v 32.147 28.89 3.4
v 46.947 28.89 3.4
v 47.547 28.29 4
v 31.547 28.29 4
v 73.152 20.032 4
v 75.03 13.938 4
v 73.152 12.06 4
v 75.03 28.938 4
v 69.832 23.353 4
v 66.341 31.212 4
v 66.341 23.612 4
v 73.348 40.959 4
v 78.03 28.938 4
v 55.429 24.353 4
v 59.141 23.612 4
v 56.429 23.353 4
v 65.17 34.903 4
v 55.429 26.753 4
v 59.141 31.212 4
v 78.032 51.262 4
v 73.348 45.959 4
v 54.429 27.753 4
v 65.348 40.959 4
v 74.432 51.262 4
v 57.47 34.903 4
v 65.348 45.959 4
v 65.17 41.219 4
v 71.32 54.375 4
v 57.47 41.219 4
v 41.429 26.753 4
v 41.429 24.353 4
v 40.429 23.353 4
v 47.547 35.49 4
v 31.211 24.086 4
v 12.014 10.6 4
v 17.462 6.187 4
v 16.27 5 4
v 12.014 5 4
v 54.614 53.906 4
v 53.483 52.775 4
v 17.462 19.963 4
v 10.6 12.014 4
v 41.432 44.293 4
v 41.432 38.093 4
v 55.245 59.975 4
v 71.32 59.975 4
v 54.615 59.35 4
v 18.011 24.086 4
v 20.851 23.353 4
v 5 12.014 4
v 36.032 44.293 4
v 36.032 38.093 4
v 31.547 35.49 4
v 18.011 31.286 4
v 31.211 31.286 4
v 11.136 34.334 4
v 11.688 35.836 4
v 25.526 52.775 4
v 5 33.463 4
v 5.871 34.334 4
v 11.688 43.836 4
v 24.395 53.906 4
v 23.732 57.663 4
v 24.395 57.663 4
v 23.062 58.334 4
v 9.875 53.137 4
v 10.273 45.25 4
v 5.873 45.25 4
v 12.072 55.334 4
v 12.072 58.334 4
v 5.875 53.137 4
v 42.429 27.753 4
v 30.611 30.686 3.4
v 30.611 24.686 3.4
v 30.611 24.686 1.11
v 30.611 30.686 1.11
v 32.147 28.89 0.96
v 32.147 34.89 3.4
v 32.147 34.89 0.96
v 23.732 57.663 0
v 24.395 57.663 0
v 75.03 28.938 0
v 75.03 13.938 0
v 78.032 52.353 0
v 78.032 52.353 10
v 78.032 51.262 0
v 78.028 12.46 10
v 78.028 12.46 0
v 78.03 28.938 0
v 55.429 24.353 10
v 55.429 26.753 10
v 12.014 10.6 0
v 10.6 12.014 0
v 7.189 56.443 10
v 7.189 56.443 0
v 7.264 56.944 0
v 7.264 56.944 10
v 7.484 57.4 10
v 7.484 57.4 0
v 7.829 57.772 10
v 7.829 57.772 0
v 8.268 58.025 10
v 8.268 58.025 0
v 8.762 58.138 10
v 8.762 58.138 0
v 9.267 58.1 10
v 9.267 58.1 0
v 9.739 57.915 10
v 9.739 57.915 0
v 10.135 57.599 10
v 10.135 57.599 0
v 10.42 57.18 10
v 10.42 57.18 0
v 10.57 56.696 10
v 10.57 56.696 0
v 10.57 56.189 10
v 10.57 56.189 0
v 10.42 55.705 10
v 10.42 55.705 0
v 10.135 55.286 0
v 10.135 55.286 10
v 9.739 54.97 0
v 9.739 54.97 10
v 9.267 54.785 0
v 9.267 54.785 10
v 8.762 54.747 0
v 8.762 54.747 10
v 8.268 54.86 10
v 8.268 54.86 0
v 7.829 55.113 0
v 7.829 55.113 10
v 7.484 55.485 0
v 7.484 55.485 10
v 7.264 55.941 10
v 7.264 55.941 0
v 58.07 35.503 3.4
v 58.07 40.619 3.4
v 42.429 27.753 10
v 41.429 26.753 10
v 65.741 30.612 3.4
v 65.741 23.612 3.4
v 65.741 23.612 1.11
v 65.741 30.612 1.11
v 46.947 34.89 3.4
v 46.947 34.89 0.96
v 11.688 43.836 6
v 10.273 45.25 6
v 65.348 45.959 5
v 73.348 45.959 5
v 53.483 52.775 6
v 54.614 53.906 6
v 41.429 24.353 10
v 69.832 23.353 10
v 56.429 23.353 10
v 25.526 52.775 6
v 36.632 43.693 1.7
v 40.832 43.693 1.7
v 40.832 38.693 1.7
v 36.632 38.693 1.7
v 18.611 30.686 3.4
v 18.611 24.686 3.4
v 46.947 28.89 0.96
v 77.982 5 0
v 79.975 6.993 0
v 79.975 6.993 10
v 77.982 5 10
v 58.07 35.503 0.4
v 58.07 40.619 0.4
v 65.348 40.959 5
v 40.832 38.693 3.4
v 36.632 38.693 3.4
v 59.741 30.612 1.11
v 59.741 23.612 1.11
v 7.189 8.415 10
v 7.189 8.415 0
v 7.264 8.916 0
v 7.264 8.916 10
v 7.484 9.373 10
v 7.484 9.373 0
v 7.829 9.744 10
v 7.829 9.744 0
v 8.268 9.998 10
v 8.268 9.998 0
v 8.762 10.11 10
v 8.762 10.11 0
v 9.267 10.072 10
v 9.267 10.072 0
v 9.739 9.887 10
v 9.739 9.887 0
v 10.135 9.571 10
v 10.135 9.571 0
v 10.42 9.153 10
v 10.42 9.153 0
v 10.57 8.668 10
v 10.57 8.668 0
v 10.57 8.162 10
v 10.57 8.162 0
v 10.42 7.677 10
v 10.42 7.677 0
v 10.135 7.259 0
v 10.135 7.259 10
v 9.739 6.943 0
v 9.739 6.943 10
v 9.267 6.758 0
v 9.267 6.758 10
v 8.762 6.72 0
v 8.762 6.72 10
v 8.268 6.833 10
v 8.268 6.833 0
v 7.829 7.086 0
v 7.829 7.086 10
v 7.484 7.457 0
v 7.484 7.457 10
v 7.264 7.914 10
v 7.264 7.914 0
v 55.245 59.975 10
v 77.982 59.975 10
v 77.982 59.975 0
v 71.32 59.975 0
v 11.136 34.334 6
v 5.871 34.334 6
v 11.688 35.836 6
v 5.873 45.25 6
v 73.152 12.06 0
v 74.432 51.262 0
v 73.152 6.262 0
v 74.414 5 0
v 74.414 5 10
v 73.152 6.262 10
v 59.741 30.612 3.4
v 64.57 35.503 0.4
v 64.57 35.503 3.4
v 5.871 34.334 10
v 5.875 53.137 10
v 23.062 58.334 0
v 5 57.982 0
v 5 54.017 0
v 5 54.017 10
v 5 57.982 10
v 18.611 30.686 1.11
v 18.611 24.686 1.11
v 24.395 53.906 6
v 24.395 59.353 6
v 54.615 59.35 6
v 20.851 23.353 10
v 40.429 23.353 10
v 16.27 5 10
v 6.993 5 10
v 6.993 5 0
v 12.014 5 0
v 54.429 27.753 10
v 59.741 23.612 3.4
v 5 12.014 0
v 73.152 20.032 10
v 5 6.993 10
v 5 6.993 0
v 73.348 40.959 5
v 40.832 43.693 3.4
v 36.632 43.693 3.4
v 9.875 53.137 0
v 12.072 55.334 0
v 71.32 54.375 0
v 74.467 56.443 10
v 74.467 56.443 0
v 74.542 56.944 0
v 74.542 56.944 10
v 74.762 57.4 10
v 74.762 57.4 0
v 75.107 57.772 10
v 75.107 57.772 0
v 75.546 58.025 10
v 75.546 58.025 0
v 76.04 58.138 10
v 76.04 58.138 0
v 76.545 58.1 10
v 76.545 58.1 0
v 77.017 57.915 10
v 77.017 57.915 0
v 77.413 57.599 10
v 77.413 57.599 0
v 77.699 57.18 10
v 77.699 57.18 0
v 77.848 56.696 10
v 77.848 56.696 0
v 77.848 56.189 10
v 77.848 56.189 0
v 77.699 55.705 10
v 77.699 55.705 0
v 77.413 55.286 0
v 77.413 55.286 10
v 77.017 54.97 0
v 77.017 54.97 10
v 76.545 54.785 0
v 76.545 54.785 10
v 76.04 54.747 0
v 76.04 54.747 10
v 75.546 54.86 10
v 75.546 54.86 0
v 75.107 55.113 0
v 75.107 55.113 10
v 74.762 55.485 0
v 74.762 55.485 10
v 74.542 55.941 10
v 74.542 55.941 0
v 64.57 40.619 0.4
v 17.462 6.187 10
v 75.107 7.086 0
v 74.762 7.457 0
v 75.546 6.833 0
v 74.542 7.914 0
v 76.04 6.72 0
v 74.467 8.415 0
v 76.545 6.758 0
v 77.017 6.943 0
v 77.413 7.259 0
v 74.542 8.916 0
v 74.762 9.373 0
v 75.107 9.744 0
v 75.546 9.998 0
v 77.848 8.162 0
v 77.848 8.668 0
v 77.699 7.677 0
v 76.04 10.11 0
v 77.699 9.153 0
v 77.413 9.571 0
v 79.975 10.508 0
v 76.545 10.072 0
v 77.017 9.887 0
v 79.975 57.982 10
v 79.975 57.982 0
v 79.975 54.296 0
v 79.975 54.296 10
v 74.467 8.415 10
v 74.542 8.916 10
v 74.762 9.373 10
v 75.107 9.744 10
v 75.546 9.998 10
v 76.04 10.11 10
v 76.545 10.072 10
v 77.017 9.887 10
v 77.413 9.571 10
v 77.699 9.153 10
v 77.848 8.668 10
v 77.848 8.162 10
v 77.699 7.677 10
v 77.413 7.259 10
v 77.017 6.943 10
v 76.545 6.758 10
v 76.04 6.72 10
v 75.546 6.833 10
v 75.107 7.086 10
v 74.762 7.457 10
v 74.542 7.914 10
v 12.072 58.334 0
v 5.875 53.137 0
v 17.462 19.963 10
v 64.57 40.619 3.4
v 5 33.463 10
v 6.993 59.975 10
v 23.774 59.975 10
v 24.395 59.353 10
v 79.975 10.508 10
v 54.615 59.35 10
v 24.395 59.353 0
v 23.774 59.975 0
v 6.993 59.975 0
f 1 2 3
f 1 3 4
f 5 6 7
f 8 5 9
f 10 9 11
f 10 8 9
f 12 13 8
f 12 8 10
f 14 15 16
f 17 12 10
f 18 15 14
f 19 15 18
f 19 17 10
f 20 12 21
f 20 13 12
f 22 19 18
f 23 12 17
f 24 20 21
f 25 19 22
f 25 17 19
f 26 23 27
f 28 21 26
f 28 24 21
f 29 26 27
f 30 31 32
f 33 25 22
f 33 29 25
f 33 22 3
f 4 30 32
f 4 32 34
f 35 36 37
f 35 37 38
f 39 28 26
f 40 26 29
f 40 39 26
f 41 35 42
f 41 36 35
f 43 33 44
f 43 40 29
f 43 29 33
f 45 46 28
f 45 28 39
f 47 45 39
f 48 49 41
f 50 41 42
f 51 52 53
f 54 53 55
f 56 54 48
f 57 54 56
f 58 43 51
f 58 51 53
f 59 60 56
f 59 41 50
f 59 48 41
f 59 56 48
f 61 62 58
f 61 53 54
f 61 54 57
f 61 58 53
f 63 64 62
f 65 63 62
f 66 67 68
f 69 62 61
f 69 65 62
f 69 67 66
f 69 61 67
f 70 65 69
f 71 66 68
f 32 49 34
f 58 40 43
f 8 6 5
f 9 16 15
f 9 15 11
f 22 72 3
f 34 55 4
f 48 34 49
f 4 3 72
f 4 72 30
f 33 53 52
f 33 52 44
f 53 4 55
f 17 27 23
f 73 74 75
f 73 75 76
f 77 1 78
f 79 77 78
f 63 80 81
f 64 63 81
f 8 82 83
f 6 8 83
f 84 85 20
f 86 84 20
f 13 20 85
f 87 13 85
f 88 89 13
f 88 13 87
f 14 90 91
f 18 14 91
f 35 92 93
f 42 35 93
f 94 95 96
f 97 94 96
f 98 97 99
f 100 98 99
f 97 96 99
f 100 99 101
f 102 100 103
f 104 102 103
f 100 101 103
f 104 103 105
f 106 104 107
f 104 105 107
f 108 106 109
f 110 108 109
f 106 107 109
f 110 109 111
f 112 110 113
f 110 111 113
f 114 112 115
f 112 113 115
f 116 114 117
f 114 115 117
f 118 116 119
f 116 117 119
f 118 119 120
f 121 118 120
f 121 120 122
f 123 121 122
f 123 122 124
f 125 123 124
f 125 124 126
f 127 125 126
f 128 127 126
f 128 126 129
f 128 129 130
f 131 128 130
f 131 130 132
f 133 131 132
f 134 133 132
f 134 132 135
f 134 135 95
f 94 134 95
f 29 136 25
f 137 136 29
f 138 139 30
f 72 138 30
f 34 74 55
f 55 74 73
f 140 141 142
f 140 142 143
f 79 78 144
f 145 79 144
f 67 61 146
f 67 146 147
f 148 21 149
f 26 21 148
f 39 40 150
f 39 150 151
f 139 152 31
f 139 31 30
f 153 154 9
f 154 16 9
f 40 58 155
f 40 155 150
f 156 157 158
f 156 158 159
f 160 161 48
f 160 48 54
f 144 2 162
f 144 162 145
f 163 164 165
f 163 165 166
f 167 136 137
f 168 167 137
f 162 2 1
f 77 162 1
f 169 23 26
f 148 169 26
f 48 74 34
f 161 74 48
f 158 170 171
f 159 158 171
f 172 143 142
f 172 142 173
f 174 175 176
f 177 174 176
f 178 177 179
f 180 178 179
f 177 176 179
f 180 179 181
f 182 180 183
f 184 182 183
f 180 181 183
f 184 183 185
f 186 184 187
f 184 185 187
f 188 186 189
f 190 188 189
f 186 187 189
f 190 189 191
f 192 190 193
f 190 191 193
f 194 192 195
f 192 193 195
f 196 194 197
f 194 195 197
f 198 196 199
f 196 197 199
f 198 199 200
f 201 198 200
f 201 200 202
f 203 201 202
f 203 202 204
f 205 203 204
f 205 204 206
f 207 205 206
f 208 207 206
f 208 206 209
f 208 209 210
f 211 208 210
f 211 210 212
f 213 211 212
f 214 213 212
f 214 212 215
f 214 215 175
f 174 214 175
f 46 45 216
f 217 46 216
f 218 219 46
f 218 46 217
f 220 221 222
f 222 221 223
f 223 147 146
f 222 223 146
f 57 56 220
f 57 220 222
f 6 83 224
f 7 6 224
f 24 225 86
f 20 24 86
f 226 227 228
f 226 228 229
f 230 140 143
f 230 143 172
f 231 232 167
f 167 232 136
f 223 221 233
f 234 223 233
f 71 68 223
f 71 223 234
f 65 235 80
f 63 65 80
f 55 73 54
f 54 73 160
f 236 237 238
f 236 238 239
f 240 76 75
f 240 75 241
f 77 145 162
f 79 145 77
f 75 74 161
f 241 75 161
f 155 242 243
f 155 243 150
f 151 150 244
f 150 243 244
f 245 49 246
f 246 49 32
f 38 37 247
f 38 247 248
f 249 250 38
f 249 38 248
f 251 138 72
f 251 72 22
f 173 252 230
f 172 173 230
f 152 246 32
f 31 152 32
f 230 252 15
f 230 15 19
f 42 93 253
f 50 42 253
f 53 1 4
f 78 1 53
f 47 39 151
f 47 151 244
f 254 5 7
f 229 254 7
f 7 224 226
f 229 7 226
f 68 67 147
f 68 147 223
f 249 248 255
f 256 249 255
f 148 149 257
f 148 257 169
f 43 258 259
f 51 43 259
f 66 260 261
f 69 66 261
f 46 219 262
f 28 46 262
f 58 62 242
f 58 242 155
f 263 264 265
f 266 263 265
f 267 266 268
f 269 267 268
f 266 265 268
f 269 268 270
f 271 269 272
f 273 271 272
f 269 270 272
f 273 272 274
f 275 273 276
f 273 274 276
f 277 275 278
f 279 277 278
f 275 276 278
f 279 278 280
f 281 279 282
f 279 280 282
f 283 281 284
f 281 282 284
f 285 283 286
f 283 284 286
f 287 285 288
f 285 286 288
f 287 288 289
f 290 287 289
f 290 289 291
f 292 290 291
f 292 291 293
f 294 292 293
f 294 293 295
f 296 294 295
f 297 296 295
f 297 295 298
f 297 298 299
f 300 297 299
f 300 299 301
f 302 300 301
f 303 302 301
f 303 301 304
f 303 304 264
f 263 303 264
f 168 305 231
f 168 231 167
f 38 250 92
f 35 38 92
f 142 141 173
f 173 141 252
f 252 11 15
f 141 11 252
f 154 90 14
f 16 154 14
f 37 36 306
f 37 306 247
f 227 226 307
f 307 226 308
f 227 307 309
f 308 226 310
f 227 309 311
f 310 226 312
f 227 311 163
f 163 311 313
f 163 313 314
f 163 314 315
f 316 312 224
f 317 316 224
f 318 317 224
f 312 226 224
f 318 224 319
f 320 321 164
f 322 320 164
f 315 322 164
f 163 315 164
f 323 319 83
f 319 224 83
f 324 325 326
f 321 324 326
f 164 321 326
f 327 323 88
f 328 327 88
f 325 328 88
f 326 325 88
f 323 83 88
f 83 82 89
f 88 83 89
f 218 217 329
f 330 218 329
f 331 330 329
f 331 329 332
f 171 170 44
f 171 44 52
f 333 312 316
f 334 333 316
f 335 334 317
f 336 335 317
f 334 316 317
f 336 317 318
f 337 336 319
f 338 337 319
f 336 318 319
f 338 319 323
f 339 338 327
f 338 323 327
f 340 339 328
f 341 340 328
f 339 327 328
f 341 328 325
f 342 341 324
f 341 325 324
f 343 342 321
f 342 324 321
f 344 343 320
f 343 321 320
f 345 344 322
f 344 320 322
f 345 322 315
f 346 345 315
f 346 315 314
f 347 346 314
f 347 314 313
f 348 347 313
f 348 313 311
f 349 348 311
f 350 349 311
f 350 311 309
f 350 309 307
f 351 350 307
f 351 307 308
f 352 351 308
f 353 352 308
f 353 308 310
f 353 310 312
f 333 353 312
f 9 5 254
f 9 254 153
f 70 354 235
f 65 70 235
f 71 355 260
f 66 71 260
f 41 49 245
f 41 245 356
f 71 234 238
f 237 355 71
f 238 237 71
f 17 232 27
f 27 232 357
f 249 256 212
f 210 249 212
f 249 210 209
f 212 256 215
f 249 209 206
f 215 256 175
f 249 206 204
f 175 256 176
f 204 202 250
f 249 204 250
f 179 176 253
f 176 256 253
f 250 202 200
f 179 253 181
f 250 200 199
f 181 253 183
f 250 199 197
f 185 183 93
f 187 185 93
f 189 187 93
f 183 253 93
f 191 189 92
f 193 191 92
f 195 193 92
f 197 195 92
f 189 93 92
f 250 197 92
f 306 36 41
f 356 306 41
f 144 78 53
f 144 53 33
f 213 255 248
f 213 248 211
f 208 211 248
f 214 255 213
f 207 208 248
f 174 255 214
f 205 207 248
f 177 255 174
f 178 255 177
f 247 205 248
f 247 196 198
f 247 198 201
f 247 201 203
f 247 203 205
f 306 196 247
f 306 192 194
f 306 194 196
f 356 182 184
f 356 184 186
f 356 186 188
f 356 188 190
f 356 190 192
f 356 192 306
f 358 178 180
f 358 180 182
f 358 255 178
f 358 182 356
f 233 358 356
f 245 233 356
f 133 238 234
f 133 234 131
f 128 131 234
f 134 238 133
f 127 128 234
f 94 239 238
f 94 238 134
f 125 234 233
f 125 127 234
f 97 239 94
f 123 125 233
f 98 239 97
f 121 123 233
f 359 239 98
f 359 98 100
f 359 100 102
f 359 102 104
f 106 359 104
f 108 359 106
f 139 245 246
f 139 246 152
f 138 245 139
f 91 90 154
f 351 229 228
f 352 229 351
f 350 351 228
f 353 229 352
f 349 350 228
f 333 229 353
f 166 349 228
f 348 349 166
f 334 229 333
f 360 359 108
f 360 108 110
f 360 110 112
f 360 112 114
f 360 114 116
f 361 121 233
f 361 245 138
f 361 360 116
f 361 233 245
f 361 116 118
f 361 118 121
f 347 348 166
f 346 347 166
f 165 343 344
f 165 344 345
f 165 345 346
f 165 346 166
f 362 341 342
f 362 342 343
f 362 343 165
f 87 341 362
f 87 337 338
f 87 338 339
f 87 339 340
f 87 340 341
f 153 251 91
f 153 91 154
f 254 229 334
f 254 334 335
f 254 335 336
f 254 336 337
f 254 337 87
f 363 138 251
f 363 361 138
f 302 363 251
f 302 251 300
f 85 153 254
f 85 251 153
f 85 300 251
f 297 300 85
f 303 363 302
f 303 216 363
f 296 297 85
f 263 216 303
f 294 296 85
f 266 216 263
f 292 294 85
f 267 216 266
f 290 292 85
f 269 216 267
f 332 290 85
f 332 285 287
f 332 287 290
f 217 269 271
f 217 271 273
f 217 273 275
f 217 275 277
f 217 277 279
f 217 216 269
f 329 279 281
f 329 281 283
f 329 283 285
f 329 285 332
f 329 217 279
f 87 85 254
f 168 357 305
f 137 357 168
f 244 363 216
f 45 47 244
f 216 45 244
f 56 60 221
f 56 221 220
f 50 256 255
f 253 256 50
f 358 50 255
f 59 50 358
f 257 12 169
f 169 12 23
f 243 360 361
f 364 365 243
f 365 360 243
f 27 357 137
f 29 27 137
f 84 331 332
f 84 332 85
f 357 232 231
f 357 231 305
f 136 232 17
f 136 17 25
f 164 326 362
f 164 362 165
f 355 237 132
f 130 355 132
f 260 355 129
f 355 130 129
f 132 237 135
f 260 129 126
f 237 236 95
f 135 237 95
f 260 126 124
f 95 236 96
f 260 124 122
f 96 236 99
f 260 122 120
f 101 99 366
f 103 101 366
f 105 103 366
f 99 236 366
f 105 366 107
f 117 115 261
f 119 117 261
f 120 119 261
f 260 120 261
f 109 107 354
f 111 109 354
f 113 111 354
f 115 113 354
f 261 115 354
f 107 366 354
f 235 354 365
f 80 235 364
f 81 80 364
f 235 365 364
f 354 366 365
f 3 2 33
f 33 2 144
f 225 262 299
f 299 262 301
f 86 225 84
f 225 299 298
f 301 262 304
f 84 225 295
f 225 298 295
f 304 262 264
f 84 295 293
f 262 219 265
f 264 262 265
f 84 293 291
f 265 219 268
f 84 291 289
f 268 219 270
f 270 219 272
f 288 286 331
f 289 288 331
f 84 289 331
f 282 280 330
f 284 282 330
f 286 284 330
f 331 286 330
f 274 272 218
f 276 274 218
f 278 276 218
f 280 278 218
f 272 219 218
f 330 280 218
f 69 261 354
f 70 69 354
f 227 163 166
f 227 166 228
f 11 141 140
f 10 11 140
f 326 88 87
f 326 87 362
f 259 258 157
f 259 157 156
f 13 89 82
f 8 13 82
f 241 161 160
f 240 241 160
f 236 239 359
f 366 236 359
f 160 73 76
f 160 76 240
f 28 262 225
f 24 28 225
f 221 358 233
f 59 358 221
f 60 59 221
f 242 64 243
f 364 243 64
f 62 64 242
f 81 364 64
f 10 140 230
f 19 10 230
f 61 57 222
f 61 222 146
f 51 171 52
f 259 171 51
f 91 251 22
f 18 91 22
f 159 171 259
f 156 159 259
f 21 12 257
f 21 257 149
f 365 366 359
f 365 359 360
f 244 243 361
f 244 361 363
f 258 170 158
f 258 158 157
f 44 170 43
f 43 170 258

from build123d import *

# Parameters (mm, degrees)
SKETCH_1_W           = 85
SKETCH_1_H           = 65
EXTRUDE_1_DEPTH      = 10
CUT_EXTRUDE_1_REACH  = 109.471
SKETCH_2_R           = 1.7
CUT_EXTRUDE_2_REACH  = 109.471
SKETCH_3_W           = 85
SKETCH_3_H           = 65
CUT_EXTRUDE_4_REACH  = 102.464
CUT_EXTRUDE_7_DEPTH  = 6
CUT_EXTRUDE_8_DEPTH  = 6
CUT_EXTRUDE_11_DEPTH = 4
SKETCH_8_W           = 8
SKETCH_8_H           = 5
CUT_EXTRUDE_12_DEPTH = 1
SKETCH_10_W          = 5.4
SKETCH_10_H          = 6
SKETCH_10_W_2        = 4
EXTRUDE_2_DEPTH      = 3.04
SKETCH_11_W          = 4.2
SKETCH_11_H          = 5
EXTRUDE_3_DEPTH      = 2.300115
SKETCH_12_W          = 12
SKETCH_12_H          = 6
EXTRUDE_4_DEPTH      = 2.89
SKETCH_13_W          = 6.499986347
SKETCH_13_H          = 5.115524378
EXTRUDE_5_DEPTH      = 3.6
SKETCH_14_W          = 6
SKETCH_14_H          = 7
EXTRUDE_6_DEPTH      = 2.890002
SKETCH_15_W          = 14
SKETCH_15_H          = 4.4
CUT_EXTRUDE_13_DEPTH = 6
CHAMFER_1_SIZE       = 1
CHAMFER_2_SIZE       = 0.6
CHAMFER_3_SIZE       = 0.6
CHAMFER_4_SIZE       = 0.6
CHAMFER_5_SIZE       = 0.6
CHAMFER_6_SIZE       = 0.6


with BuildPart() as part:
    # 草图1 → 凸台-拉伸1 (new body)
    with BuildSketch(Plane.XY):
        with Locations((42.5, 32.5)):
            Rectangle(SKETCH_1_W, SKETCH_1_H)
    extrude(amount=EXTRUDE_1_DEPTH)

    # 草图2 → 切除-拉伸1 (cut, up to next)
    with BuildSketch(Plane(origin=(0, 0, 0), x_dir=(-1, 0, 0), z_dir=(0, 0, -1)), mode=Mode.PRIVATE) as cut_extrude_1_sk1:
        with Locations((-76.166921514, 56.442524765)):
            Circle(SKETCH_2_R)
    cut_extrude_1_tool1 = extrude(cut_extrude_1_sk1.sketch, amount=-CUT_EXTRUDE_1_REACH, mode=Mode.PRIVATE) & part.part
    # 草图2 → 切除-拉伸1 (cut, up to next)
    with BuildSketch(Plane(origin=(0, 0, 0), x_dir=(-1, 0, 0), z_dir=(0, 0, -1)), mode=Mode.PRIVATE) as cut_extrude_1_sk2:
        with Locations((-8.888803658, 56.442524765)):
            Circle(SKETCH_2_R)
    cut_extrude_1_tool2 = extrude(cut_extrude_1_sk2.sketch, amount=-CUT_EXTRUDE_1_REACH, mode=Mode.PRIVATE) & part.part
    # 草图2 → 切除-拉伸1 (cut, up to next)
    with BuildSketch(Plane(origin=(0, 0, 0), x_dir=(-1, 0, 0), z_dir=(0, 0, -1)), mode=Mode.PRIVATE) as cut_extrude_1_sk3:
        with Locations((-76.166921514, 8.41508509)):
            Circle(SKETCH_2_R)
    cut_extrude_1_tool3 = extrude(cut_extrude_1_sk3.sketch, amount=-CUT_EXTRUDE_1_REACH, mode=Mode.PRIVATE) & part.part
    # 草图2 → 切除-拉伸1 (cut, up to next)
    with BuildSketch(Plane(origin=(0, 0, 0), x_dir=(-1, 0, 0), z_dir=(0, 0, -1)), mode=Mode.PRIVATE) as cut_extrude_1_sk4:
        with Locations((-8.888803658, 8.41508509)):
            Circle(SKETCH_2_R)
    cut_extrude_1_tool4 = extrude(cut_extrude_1_sk4.sketch, amount=-CUT_EXTRUDE_1_REACH, mode=Mode.PRIVATE) & part.part
    add(cut_extrude_1_tool1.solids().sort_by_distance((76.166922, 56.442525, 0))[0], mode=Mode.SUBTRACT)
    add(cut_extrude_1_tool2.solids().sort_by_distance((8.888804, 56.442525, 0))[0], mode=Mode.SUBTRACT)
    add(cut_extrude_1_tool3.solids().sort_by_distance((76.166922, 8.415085, 0))[0], mode=Mode.SUBTRACT)
    add(cut_extrude_1_tool4.solids().sort_by_distance((8.888804, 8.415085, 0))[0], mode=Mode.SUBTRACT)

    # 草图3 → 切除-拉伸2 (cut, up to next)
    with BuildSketch(Plane(origin=(0, 0, 0), x_dir=(-1, 0, 0), z_dir=(0, 0, -1)), mode=Mode.PRIVATE) as cut_extrude_2_sk1:
        with Locations((-42.5, 32.5)):
            Rectangle(SKETCH_3_W, SKETCH_3_H)
        Polygon((-5, 33.462892894), (-5.871324699, 34.334217592), (-5.87504445, 53.137061214), (-5, 54.017366187), (-5, 57.982143592), (-6.992565577, 59.974709169), (-23.773560915, 59.974709169), (-24.394872914, 59.353397171), (-54.61482093, 59.349677419), (-55.245113202, 59.974709169), (-77.982184232, 59.974709169), (-79.974749809, 57.982143592), (-79.97474981, 54.295829484), (-78.032030648, 52.353110322), (-78.028310897, 12.45999492), (-79.97474981, 10.508295484), (-79.97474981, 6.992565577), (-77.982184232, 5), (-74.414239441, 5), (-73.152434681, 6.26180476), (-60.043505207, 6.265524511), (-58.772720173, 5), (-32.926479725, 5), (-31.743585303, 6.182894422), (-17.461559563, 6.186614173), (-16.269684867, 5), (-6.992565577, 5), (-5, 6.992565577), align=None, mode=Mode.SUBTRACT)
    cut_extrude_2_tool1 = extrude(cut_extrude_2_sk1.sketch, amount=-CUT_EXTRUDE_2_REACH, mode=Mode.PRIVATE) & part.part
    add(cut_extrude_2_tool1.solids().sort_by_distance((42.5, 63.929953, 0))[0], mode=Mode.SUBTRACT)

    # 草图4 → 切除-拉伸4 (cut, up to next)
    with BuildSketch(Plane(origin=(0, 0, 0), x_dir=(-1, 0, 0), z_dir=(0, 0, -1)), mode=Mode.PRIVATE) as cut_extrude_4_sk1:
        Polygon((-73.152434681, 6.26180476), (-73.152434681, 20.032317315), (-69.831576581, 23.353175415), (-46.787984184, 23.353175415), (-20.851296271, 23.353175415), (-17.461559563, 19.963438707), (-17.461559563, 6.186614173), (-17.461559563, 0.193960815), (-73.152434681, 0.193960815), align=None)
    cut_extrude_4_tool1 = extrude(cut_extrude_4_sk1.sketch, amount=-CUT_EXTRUDE_4_REACH, mode=Mode.PRIVATE) & part.part
    add(cut_extrude_4_tool1.solids().sort_by_distance((45.311727, 11.681443, 0))[0], mode=Mode.SUBTRACT)

    # 草图5 → 切除-拉伸7 (cut)
    with BuildSketch(Plane(origin=(0, 0, 0), x_dir=(-1, 0, 0), z_dir=(0, 0, -1))):
        Polygon((-24.394872914, 59.353397171), (-24.394872914, 53.906418167), (-25.526104495, 52.774908066), (-53.482640788, 52.774908066), (-54.614150889, 53.906139647), (-54.61482093, 59.349677419), align=None)
    extrude(amount=-CUT_EXTRUDE_7_DEPTH, mode=Mode.SUBTRACT)

    # 草图6 → 切除-拉伸8 (cut)
    with BuildSketch(Plane(origin=(0, 0, 0), x_dir=(-1, 0, 0), z_dir=(0, 0, -1))):
        Polygon((-5.871324699, 34.334217592), (-11.136213102, 34.334217592), (-11.687697798, 35.836171197), (-11.687697798, 43.836171197), (-10.273484235, 45.250384759), (-5.873484235, 45.250384759), align=None)
    extrude(amount=-CUT_EXTRUDE_8_DEPTH, mode=Mode.SUBTRACT)

    # 草图7 → 切除-拉伸11 (cut)
    with BuildSketch(Plane(origin=(0, 0, 0), x_dir=(-1, 0, 0), z_dir=(0, 0, -1))):
        Polygon((-74.432117646, 51.26230094), (-76.432117646, 51.26230094), (-78.031928938, 51.26230094), (-78.029847328, 28.93771831), (-75.029847328, 28.93771831), (-75.029847328, 13.93771831), (-73.152434681, 12.060305663), (-73.152434681, 20.032317315), (-69.831576581, 23.353175415), (-20.851296271, 23.353175415), (-17.461559563, 19.963438707), (-17.461559563, 6.186614173), (-16.269684867, 5), (-12.014024847, 5), (-12.014024847, 10.599811284), (-10.599811284, 12.014024847), (-6.599811284, 12.014024847), (-5, 12.014024847), (-5, 33.462892894), (-5.871324699, 34.334217592), (-11.136213102, 34.334217592), (-11.687697798, 35.836171197), (-11.687697798, 43.836171197), (-10.273484235, 45.250384759), (-5.873484235, 45.250384759), (-5.87504445, 53.137061214), (-9.87504445, 53.137061214), (-12.071959353, 55.333976117), (-12.071959353, 58.333976117), (-23.061659554, 58.333976117), (-23.732127818, 57.663342778), (-24.394872914, 57.663261201), (-24.394872914, 53.906418167), (-25.526104495, 52.774908066), (-53.482640788, 52.774908066), (-54.614150889, 53.906139647), (-54.61482093, 59.349677419), (-55.245113202, 59.974709169), (-71.319520701, 59.974709169), (-71.319520701, 58.374897885), (-71.319520701, 54.374897885), align=None)
    extrude(amount=-CUT_EXTRUDE_11_DEPTH, mode=Mode.SUBTRACT)

    # 草图8 → 切除-拉伸12 (cut)
    with BuildSketch(Plane(origin=(0, 0, 4), x_dir=(-1, 0, 0), z_dir=(0, 0, -1))):
        with Locations((-69.348077333, 43.45871309)):
            Rectangle(SKETCH_8_W, SKETCH_8_H)
    extrude(amount=-CUT_EXTRUDE_12_DEPTH, mode=Mode.SUBTRACT)

    # 草图10 → 凸台-拉伸2 (add)
    with BuildSketch(Plane(origin=(0, 0, 4), x_dir=(-1, 0, 0), z_dir=(0, 0, -1))):
        with Locations((-44.246532103, 31.889800214)):
            Rectangle(SKETCH_10_W, SKETCH_10_H)
        with Locations((-39.546532103, 31.889800214)):
            Rectangle(SKETCH_10_W_2, SKETCH_10_H)
        with Locations((-34.846532103, 31.889800214)):
            Rectangle(SKETCH_10_W, SKETCH_10_H)
    extrude(amount=EXTRUDE_2_DEPTH)

    # 草图11 → 凸台-拉伸3 (add)
    with BuildSketch(Plane(origin=(0, 0, 4), x_dir=(-1, 0, 0), z_dir=(0, 0, -1))):
        with Locations((-38.731800654, 41.192864876)):
            Rectangle(SKETCH_11_W, SKETCH_11_H)
    extrude(amount=EXTRUDE_3_DEPTH)

    # 草图12 → 凸台-拉伸4 (add)
    with BuildSketch(Plane(origin=(0, 0, 4), x_dir=(-1, 0, 0), z_dir=(0, 0, -1))):
        with Locations((-24.610605003, 27.685920752)):
            Rectangle(SKETCH_12_W, SKETCH_12_H)
    extrude(amount=EXTRUDE_4_DEPTH)

    # 草图13 → 凸台-拉伸5 (add)
    with BuildSketch(Plane(origin=(0, 0, 4), x_dir=(-1, 0, 0), z_dir=(0, 0, -1))):
        with Locations((-61.319842519, 38.061085021)):
            Rectangle(SKETCH_13_W, SKETCH_13_H)
    extrude(amount=EXTRUDE_5_DEPTH)

    # 草图14 → 凸台-拉伸6 (add)
    with BuildSketch(Plane(origin=(0, 0, 4), x_dir=(-1, 0, 0), z_dir=(0, 0, -1))):
        with Locations((-62.740849727, 27.111901224)):
            Rectangle(SKETCH_14_W, SKETCH_14_H)
    extrude(amount=EXTRUDE_6_DEPTH)

    # 草图15 → 切除-拉伸13 (cut)
    with BuildSketch(Plane.XY.offset(10)):
        with Locations((48.428848604, 25.553175415)):
            Rectangle(SKETCH_15_W, SKETCH_15_H)
    extrude(amount=-CUT_EXTRUDE_13_DEPTH, mode=Mode.SUBTRACT)

    # 倒角1
    chamfer_1_edges = [part.edges().sort_by_distance(p)[0] for p in [
        (55.428848604, 23.353175415, 7),
        (55.428848604, 27.753175415, 7),
        (41.428848604, 27.753175415, 7),
        (41.428848604, 23.353175415, 7),
    ]]
    chamfer(chamfer_1_edges, length=CHAMFER_1_SIZE)

    # 倒角2
    chamfer_2_edges = [part.edges().sort_by_distance(p)[0] for p in [
        (64.569835693, 38.061085021, 4),
        (61.31984252, 35.503322832, 4),
        (58.069849346, 38.061085021, 4),
        (61.31984252, 40.61884721, 4),
    ]]
    chamfer(chamfer_2_edges, length=CHAMFER_2_SIZE)

    # 倒角3
    chamfer_3_edges = [part.edges().sort_by_distance(p)[0] for p in [
        (39.546532103, 28.889800214, 4),
        (46.946532103, 31.889800214, 4),
        (39.546532103, 34.889800214, 4),
        (32.146532103, 31.889800214, 4),
    ]]
    chamfer(chamfer_3_edges, length=CHAMFER_3_SIZE)

    # 倒角4
    chamfer_4_edges = [part.edges().sort_by_distance(p)[0] for p in [
        (30.610605003, 27.685920752, 4),
        (24.610605003, 24.685920752, 4),
        (18.610605003, 27.685920752, 4),
        (24.610605003, 30.685920752, 4),
    ]]
    chamfer(chamfer_4_edges, length=CHAMFER_4_SIZE)

    # 倒角5
    chamfer_5_edges = [part.edges().sort_by_distance(p)[0] for p in [
        (40.831800654, 41.192864876, 4),
        (38.731800654, 38.692864876, 4),
        (36.631800654, 41.192864876, 4),
        (38.731800654, 43.692864876, 4),
    ]]
    chamfer(chamfer_5_edges, length=CHAMFER_5_SIZE)

    # 倒角6
    chamfer_6_edges = [part.edges().sort_by_distance(p)[0] for p in [
        (65.740849727, 27.111901224, 4),
        (59.740849727, 27.111901224, 4),
        (62.740849727, 30.611901224, 4),
    ]]
    chamfer(chamfer_6_edges, length=CHAMFER_6_SIZE)


solid = part.part
